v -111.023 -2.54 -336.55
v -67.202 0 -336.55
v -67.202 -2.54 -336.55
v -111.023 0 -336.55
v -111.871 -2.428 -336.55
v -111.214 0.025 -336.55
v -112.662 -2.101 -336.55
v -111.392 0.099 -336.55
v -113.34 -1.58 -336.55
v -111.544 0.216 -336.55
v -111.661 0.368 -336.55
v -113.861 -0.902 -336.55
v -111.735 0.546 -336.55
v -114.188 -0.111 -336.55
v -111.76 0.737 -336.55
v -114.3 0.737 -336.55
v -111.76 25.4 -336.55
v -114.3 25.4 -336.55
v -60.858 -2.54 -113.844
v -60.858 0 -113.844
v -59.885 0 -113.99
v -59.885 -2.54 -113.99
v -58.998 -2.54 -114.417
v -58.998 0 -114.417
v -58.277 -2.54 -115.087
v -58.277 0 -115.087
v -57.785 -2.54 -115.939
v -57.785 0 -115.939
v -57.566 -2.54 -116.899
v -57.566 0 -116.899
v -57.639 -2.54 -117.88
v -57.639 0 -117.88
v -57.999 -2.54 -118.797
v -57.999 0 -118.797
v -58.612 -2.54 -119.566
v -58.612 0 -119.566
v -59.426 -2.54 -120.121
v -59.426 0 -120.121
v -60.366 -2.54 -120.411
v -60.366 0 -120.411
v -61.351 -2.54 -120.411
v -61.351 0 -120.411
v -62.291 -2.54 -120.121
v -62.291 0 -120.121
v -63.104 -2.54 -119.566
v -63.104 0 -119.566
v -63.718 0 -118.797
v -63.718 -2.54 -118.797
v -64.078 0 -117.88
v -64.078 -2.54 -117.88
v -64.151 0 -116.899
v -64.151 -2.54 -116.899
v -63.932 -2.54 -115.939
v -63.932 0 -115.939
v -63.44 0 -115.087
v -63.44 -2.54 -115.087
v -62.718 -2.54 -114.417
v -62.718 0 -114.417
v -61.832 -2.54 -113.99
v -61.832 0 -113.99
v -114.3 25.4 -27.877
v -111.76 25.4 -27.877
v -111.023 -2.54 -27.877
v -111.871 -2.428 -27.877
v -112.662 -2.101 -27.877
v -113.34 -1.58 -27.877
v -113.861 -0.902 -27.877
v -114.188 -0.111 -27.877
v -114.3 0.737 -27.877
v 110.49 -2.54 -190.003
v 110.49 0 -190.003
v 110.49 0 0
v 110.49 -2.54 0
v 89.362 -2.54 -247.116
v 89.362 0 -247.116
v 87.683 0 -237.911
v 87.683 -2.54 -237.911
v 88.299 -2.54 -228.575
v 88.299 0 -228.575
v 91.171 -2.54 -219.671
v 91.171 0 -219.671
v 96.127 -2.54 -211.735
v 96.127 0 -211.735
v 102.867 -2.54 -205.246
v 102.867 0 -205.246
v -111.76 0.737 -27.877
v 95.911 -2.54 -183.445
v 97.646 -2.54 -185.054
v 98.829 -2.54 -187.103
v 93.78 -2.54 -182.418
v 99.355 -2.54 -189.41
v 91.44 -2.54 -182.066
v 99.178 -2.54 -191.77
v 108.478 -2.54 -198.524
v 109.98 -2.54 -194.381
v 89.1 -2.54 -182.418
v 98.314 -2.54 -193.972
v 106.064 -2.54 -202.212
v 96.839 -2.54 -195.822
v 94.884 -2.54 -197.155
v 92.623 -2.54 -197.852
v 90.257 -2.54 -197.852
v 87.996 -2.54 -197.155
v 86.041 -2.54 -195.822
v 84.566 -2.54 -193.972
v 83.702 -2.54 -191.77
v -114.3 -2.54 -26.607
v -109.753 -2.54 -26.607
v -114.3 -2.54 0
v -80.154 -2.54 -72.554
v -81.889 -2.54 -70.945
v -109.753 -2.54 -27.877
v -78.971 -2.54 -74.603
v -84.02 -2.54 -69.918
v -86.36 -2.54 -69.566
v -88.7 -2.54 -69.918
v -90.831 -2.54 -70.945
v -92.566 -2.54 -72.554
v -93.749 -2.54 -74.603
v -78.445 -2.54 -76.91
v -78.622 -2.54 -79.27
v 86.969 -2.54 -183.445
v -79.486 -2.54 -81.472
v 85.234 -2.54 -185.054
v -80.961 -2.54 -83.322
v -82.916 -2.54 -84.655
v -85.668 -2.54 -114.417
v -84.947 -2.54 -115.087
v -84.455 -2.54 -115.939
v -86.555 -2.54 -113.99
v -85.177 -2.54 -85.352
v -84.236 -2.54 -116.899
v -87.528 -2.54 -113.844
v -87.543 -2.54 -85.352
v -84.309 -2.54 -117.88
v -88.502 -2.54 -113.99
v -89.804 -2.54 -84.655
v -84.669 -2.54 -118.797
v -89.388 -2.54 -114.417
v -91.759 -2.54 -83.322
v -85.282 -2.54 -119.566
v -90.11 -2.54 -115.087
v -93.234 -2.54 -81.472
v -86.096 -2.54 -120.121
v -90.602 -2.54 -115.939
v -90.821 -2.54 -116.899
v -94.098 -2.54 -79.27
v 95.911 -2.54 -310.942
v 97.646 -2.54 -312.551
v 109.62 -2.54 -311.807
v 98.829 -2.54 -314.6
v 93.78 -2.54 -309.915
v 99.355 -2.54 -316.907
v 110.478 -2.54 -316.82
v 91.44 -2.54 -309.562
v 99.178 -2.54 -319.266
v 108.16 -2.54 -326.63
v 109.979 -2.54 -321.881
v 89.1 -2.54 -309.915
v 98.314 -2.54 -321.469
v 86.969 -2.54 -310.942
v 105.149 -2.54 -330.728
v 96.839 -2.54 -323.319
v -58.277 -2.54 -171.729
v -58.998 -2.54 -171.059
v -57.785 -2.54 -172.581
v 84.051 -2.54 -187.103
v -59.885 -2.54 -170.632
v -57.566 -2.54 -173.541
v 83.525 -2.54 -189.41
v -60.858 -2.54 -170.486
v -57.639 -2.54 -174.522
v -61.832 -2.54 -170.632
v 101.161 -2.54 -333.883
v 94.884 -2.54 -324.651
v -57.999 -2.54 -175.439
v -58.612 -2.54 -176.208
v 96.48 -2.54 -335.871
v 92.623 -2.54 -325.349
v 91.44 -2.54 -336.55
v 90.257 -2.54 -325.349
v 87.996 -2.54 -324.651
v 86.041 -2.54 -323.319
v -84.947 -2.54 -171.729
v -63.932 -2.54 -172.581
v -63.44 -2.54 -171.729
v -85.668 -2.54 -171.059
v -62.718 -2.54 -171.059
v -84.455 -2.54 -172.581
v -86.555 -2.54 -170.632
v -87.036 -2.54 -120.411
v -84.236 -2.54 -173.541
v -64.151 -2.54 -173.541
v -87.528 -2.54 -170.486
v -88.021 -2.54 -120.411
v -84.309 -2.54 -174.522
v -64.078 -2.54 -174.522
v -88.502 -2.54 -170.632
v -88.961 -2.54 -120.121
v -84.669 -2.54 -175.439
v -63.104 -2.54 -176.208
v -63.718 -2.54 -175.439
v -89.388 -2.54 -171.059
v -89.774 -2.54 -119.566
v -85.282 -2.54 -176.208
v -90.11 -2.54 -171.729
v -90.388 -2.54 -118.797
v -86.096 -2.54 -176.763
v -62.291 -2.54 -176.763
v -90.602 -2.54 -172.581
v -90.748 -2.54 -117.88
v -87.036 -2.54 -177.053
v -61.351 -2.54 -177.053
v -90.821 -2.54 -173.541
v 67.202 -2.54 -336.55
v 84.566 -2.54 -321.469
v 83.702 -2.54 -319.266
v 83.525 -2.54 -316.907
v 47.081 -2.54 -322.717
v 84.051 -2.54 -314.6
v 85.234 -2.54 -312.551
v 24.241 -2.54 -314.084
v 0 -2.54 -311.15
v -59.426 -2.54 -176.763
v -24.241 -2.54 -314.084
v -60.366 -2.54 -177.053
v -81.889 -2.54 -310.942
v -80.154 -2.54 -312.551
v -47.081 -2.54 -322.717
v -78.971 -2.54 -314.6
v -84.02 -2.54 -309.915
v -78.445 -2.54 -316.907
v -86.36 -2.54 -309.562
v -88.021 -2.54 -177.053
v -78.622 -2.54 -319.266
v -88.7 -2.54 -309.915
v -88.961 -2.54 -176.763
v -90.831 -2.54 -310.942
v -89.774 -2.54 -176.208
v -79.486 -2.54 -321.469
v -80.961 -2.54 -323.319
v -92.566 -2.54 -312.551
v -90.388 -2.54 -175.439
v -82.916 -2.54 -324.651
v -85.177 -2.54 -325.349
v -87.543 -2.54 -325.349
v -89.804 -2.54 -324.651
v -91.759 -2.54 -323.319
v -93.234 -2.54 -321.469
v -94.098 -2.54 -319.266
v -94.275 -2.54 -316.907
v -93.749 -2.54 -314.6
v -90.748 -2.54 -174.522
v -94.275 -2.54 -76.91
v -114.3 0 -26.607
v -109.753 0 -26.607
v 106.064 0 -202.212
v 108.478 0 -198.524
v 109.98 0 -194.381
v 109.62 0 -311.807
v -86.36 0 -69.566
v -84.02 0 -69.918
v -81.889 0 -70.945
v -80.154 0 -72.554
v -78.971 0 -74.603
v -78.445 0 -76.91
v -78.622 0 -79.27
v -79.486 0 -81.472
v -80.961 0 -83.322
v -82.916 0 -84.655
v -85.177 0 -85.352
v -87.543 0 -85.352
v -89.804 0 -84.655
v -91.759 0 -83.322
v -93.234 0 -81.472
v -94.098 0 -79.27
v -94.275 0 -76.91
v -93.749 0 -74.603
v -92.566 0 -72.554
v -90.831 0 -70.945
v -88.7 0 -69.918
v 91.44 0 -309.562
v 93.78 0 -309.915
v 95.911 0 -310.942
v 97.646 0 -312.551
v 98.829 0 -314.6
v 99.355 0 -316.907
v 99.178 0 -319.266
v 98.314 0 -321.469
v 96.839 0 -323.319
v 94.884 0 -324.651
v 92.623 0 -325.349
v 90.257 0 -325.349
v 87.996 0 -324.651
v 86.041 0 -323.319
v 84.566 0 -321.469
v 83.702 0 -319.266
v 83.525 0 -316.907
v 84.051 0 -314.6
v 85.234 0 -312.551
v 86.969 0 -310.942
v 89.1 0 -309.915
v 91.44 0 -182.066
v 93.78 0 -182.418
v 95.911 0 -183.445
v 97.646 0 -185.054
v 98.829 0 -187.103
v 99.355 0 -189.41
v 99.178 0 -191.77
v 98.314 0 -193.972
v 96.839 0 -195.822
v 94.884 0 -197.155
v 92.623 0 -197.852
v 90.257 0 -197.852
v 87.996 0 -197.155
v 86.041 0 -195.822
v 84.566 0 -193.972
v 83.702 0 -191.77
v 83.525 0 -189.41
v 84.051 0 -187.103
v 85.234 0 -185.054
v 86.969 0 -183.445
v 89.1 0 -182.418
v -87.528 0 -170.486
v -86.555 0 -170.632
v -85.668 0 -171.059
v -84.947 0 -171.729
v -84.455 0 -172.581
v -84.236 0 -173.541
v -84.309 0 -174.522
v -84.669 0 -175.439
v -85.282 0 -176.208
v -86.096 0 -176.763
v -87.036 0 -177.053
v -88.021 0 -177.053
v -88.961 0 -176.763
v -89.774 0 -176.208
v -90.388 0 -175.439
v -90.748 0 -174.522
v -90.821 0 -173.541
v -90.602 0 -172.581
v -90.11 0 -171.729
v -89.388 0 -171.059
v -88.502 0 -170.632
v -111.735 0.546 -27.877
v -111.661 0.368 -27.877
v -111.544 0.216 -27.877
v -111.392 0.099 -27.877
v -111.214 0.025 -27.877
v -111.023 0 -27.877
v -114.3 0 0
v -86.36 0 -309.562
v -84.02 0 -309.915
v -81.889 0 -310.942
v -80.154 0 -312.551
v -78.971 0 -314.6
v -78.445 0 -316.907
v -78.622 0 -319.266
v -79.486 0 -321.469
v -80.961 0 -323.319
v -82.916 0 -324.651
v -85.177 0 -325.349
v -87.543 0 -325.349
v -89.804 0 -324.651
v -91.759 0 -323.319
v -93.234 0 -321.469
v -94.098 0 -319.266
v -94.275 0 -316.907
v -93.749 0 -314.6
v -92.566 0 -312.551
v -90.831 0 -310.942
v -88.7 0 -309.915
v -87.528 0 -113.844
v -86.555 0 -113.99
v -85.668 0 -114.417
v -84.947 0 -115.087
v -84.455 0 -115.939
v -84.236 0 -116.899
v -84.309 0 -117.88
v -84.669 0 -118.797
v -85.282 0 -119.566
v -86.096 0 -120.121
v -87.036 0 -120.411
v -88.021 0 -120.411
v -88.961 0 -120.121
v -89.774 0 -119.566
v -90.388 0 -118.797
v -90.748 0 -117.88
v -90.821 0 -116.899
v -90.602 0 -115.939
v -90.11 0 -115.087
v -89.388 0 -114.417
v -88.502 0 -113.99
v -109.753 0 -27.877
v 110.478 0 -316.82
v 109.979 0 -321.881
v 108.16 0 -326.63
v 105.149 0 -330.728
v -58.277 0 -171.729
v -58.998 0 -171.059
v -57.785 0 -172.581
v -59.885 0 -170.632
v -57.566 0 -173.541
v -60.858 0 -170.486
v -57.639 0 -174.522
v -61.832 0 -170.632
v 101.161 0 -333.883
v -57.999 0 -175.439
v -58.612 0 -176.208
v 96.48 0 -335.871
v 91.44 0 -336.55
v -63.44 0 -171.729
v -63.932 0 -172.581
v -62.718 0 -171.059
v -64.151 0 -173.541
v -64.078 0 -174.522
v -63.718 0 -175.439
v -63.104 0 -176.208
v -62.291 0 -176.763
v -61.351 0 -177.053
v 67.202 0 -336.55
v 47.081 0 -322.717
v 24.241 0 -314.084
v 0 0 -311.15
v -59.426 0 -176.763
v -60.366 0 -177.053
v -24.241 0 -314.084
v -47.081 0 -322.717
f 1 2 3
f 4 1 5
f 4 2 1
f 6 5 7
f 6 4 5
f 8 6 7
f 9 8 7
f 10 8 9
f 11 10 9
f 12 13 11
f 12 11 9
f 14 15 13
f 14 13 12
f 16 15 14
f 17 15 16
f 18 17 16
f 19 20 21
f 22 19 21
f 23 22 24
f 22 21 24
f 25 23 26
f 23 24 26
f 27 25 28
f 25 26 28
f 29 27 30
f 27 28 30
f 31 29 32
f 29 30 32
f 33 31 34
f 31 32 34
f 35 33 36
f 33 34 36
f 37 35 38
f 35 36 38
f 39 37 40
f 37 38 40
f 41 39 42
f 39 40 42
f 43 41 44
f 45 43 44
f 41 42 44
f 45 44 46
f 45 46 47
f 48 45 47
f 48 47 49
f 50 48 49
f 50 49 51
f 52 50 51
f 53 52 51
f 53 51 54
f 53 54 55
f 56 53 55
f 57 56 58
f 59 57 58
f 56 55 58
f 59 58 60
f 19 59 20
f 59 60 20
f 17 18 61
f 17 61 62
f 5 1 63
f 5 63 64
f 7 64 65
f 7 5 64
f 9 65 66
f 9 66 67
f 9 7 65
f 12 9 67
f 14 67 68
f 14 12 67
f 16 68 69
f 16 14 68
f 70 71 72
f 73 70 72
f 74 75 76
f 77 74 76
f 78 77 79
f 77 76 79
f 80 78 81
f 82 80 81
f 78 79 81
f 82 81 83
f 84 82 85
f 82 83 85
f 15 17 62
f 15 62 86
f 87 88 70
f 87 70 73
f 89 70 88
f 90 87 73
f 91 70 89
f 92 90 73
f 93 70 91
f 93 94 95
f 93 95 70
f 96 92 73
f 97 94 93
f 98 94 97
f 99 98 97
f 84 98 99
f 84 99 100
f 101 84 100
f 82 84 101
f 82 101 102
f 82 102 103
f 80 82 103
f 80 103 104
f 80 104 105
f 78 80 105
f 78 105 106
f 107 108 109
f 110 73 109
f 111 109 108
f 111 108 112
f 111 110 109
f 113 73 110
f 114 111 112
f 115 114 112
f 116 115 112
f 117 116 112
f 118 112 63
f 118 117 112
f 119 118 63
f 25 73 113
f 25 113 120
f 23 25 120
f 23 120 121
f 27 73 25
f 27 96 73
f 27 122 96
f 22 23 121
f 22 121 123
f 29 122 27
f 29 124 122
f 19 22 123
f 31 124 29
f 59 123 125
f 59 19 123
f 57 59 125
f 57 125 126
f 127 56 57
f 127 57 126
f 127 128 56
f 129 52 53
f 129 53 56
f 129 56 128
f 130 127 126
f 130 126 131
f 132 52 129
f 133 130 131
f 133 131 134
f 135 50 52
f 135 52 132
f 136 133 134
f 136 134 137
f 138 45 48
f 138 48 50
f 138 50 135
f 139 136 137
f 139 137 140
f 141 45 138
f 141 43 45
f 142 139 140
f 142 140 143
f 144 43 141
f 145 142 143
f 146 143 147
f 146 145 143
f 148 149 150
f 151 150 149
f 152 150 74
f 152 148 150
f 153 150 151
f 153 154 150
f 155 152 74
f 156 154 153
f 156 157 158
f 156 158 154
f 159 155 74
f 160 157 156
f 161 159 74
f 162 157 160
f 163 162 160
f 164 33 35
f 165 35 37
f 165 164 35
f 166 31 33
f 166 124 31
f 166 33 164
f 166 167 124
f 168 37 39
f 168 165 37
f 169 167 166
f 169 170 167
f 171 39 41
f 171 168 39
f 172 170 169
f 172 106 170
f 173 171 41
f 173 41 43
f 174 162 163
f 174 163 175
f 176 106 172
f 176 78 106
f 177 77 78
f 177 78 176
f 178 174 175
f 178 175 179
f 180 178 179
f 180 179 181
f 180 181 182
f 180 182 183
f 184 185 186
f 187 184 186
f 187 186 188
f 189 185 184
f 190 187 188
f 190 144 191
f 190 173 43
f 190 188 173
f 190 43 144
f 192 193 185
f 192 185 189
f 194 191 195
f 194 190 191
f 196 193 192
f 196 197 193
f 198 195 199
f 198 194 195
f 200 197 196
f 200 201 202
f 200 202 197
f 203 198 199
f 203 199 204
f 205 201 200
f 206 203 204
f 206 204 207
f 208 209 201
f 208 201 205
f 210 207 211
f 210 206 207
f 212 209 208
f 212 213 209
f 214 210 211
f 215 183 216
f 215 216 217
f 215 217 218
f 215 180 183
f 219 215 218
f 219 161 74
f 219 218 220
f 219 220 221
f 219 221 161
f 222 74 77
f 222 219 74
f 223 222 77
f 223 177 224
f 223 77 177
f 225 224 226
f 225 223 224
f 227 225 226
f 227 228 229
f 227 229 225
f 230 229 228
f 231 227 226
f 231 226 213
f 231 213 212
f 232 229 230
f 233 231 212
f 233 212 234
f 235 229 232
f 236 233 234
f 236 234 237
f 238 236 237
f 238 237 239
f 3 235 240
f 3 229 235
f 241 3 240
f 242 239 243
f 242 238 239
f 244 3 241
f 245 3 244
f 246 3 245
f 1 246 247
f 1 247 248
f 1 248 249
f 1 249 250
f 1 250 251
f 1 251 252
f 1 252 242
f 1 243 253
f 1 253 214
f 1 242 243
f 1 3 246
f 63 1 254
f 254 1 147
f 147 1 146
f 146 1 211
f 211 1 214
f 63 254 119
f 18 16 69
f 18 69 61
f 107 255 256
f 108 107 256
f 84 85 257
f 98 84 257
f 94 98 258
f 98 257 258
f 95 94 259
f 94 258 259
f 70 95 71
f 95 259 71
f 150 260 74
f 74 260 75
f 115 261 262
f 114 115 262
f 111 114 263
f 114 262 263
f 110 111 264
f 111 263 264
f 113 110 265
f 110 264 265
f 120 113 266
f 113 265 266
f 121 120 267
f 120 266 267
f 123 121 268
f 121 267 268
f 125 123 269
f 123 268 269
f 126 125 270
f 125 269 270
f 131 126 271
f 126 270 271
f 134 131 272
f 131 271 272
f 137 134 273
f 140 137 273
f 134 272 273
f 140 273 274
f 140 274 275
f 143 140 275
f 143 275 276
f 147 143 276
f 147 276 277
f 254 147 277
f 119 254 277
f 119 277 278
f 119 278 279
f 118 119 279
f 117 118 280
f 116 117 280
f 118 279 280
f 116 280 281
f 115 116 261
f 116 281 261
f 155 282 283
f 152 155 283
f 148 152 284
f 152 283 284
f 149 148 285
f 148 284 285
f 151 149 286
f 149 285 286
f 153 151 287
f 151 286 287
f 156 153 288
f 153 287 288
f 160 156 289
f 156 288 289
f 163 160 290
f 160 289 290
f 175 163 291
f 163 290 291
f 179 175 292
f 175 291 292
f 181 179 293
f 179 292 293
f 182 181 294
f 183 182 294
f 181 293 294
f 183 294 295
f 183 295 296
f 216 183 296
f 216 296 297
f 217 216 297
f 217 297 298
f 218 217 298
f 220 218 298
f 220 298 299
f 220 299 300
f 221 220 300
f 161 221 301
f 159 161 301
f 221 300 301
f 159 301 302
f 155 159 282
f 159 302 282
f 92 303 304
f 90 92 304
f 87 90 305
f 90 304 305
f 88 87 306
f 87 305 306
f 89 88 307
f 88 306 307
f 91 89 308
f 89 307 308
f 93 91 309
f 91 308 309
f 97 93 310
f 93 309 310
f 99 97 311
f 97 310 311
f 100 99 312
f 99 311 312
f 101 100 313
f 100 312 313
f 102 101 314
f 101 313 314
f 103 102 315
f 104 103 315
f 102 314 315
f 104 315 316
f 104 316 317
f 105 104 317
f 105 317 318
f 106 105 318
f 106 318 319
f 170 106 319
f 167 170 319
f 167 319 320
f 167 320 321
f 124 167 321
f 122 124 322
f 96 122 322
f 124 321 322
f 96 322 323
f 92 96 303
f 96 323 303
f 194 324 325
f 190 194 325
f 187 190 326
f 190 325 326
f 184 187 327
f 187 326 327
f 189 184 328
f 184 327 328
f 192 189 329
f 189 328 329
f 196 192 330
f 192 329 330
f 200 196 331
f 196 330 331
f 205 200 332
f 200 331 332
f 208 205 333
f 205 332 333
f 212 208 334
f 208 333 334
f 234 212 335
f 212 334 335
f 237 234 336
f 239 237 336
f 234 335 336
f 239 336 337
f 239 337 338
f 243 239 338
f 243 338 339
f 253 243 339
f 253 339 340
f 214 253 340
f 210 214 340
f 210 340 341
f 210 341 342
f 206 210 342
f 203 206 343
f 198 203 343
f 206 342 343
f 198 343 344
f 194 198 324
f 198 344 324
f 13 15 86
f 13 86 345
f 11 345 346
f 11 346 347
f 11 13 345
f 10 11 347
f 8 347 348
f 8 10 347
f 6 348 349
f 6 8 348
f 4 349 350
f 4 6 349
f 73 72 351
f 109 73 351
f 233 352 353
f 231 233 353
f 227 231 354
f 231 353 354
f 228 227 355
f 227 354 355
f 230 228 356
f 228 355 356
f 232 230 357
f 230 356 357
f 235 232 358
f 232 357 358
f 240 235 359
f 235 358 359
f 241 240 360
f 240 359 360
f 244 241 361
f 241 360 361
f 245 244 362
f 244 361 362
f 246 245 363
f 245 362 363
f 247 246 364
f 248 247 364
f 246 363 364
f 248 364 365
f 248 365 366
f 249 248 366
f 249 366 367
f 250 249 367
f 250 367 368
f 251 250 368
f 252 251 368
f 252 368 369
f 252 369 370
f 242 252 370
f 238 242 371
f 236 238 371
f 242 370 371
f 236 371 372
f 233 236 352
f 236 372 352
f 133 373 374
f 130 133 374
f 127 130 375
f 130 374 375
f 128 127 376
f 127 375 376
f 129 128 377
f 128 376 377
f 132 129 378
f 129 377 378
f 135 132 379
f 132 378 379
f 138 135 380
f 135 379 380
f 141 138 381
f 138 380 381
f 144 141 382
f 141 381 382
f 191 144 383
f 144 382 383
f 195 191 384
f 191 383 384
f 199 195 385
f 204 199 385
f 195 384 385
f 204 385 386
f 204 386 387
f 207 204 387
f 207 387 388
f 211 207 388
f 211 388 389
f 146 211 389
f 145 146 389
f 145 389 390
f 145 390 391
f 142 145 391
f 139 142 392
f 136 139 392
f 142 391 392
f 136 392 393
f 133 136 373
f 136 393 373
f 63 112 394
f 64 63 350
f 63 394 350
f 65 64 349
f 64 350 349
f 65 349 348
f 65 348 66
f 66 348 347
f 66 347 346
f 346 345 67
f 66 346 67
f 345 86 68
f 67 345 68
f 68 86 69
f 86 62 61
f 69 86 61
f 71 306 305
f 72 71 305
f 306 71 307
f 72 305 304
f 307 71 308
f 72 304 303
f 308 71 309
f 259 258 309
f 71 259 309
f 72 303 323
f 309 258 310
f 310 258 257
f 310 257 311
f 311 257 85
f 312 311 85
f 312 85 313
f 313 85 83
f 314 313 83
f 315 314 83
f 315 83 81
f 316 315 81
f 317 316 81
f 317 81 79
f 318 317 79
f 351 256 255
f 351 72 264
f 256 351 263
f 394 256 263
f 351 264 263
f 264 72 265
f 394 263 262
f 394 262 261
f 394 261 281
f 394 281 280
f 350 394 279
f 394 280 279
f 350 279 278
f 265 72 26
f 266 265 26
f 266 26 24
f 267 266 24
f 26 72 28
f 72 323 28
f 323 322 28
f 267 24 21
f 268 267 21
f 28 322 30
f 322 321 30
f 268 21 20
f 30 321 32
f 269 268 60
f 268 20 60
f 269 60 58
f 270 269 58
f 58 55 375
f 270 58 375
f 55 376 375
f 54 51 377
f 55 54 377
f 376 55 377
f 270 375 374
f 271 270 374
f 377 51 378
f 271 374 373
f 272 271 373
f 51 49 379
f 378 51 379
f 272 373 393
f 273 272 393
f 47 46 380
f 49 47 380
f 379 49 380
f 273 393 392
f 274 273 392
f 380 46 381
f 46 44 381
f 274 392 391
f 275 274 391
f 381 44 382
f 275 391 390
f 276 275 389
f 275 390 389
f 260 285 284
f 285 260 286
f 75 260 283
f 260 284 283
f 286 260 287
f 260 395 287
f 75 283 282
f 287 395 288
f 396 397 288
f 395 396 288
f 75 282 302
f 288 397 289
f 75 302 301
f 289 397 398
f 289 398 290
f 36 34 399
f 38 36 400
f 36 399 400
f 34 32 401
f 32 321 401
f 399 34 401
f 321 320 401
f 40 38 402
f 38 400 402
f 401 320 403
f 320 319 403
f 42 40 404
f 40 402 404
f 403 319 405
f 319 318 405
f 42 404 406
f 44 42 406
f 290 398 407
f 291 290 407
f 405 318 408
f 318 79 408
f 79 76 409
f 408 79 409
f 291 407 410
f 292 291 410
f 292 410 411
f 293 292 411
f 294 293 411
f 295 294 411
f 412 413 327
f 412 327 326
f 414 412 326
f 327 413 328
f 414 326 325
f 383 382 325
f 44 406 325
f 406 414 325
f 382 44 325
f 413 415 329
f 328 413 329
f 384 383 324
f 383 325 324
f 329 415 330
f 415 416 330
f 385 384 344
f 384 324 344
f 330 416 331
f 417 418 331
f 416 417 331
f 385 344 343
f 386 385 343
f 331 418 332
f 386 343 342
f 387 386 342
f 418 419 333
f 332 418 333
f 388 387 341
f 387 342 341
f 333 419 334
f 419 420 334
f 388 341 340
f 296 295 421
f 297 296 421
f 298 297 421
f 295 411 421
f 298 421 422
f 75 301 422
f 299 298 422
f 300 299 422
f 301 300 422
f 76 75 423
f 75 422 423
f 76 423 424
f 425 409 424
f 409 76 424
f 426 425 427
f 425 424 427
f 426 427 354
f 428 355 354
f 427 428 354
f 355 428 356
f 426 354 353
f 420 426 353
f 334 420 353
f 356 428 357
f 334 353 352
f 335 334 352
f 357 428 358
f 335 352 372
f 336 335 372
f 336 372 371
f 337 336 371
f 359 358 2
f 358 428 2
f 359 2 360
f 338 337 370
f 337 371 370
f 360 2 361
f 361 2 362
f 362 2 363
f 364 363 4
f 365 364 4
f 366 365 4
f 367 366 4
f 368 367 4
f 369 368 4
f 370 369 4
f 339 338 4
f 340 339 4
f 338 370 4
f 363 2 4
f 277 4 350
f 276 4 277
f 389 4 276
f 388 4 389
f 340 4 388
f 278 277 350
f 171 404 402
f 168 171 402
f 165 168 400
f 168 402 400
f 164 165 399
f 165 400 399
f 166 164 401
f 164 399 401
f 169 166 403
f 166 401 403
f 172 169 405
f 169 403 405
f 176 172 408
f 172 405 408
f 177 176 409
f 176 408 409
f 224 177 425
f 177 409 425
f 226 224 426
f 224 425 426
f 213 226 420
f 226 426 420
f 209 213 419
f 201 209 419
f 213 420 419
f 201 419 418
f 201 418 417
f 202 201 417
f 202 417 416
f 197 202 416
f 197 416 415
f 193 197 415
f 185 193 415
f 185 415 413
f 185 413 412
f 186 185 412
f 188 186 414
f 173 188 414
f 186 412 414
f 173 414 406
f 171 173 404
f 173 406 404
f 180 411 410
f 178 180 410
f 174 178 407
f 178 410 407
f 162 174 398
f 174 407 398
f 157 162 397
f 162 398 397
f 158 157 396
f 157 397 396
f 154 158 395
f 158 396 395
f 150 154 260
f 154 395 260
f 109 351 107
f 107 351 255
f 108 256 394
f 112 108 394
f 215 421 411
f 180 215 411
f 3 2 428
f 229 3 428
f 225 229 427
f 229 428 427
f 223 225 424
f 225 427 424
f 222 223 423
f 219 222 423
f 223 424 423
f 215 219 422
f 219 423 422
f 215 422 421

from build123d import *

# Parameters (mm, degrees)
SKETCH1_R                     = 7.9375
SKETCH1_R_2                   = 3.302
BASE_FLANGE1_DEPTH            = 2.54
EDGE_FLANGE1_STRIP_W          = 11.6332
EDGE_FLANGE1_STRIP_H          = 2.54
EDGE_FLANGE1_STRIP_CUT_DEPTH  = 308.6735
EDGE_FLANGE1_RELIEF_W         = 12.9032
EDGE_FLANGE1_RELIEF_H         = 1.27
EDGE_FLANGE1_RELIEF_CUT_DEPTH = 2.54
EDGE_FLANGE1_DEPTH            = 308.6735


# Sheet-metal steps are written as plain solids
with BuildPart() as part:
    # Sketch1 → Base-Flange1 (new body)
    with BuildSketch(Plane(origin=(0, 0, 0), x_dir=(1, 0, 0), z_dir=(0, 1, 0))):
        with BuildLine():
            Line((109.619528436, 311.807263764), (89.361961148, 247.115522342))
            ThreePointArc((89.361961148, 247.115522342), (89.460566801, 224.034337943), (102.867006006, 205.245559798))
            ThreePointArc((102.867006006, 205.245559798), (108.478001121, 198.524407286), (110.49, 190.003314763))
            Line((110.49, 190.003314763), (110.49, 0))
            Line((110.49, 0), (-114.3, 0))
            Line((-114.3, 0), (-114.3, 336.55))
            Line((-114.3, 336.55), (-67.202083301, 336.55))
            ThreePointArc((-67.202083301, 336.55), (0, 311.15), (67.202083301, 336.55))
            Line((67.202083301, 336.55), (91.44, 336.55))
            ThreePointArc((91.44, 336.55), (106.791695758, 328.779536221), (109.619528436, 311.807263764))
        make_face()
        with Locations(Location((-86.36, 317.5, 0), (0, 0, 270))):
            Circle(SKETCH1_R, mode=Mode.SUBTRACT)
        with Locations(Location((91.44, 317.5, 0), (0, 0, 270))):
            Circle(SKETCH1_R, mode=Mode.SUBTRACT)
        with Locations(Location((91.44, 190.003314763, 0), (0, 0, 270))):
            Circle(SKETCH1_R, mode=Mode.SUBTRACT)
        with Locations(Location((-86.36, 77.503314763, 0), (0, 0, 270))):
            Circle(SKETCH1_R, mode=Mode.SUBTRACT)
        with Locations(Location((-60.8584, 173.787563647, 0), (0, 0, 270))):
            Circle(SKETCH1_R_2, mode=Mode.SUBTRACT)
        with Locations(Location((-87.5284, 173.787563647, 0), (0, 0, 270))):
            Circle(SKETCH1_R_2, mode=Mode.SUBTRACT)
        with Locations(Location((-60.8584, 117.145563647, 0), (0, 0, 270))):
            Circle(SKETCH1_R_2, mode=Mode.SUBTRACT)
        with Locations(Location((-87.5284, 117.145563647, 0), (0, 0, 270))):
            Circle(SKETCH1_R_2, mode=Mode.SUBTRACT)
    extrude(amount=-BASE_FLANGE1_DEPTH)

    # Edge-Flange1 strip (across the edge) → Edge-Flange1 strip cut (cut)
    with BuildSketch(Plane(origin=(-114.3, 0, -336.55), x_dir=(1, 0, 0), z_dir=(0, 0, 1))):
        with Locations((-2.54, -1.27)):
            Rectangle(EDGE_FLANGE1_STRIP_W, EDGE_FLANGE1_STRIP_H)
    extrude(amount=EDGE_FLANGE1_STRIP_CUT_DEPTH, mode=Mode.SUBTRACT)

    # Edge-Flange1 relief (on the sheet) → Edge-Flange1 relief cut (cut)
    with BuildSketch(Plane(origin=(-111.0234, 0, -336.55), x_dir=(1, 0, 0), z_dir=(0, 1, 0))):
        with Locations((-5.1816, -309.3085)):
            Rectangle(EDGE_FLANGE1_RELIEF_W, EDGE_FLANGE1_RELIEF_H)
    extrude(amount=-EDGE_FLANGE1_RELIEF_CUT_DEPTH, mode=Mode.SUBTRACT)

    # Edge-Flange1 section (across the edge) → Edge-Flange1 (add)
    with BuildSketch(Plane(origin=(-114.3, 0, -336.55), x_dir=(1, 0, 0), z_dir=(0, 0, 1))):
        with BuildLine():
            Line((0, 0.7366), (0, 25.4))
            Line((0, 25.4), (2.54, 25.4))
            Line((2.54, 25.4), (2.54, 0.7366))
            ThreePointArc((2.54, 0.7366), (2.755745145, 0.215745145), (3.2766, 0))
            Line((3.2766, 0), (3.2766, -2.54))
            ThreePointArc((3.2766, -2.54), (0.959693921, -1.580306079), (0, 0.7366))
        make_face()
    extrude(amount=EDGE_FLANGE1_DEPTH)


solid = part.part
